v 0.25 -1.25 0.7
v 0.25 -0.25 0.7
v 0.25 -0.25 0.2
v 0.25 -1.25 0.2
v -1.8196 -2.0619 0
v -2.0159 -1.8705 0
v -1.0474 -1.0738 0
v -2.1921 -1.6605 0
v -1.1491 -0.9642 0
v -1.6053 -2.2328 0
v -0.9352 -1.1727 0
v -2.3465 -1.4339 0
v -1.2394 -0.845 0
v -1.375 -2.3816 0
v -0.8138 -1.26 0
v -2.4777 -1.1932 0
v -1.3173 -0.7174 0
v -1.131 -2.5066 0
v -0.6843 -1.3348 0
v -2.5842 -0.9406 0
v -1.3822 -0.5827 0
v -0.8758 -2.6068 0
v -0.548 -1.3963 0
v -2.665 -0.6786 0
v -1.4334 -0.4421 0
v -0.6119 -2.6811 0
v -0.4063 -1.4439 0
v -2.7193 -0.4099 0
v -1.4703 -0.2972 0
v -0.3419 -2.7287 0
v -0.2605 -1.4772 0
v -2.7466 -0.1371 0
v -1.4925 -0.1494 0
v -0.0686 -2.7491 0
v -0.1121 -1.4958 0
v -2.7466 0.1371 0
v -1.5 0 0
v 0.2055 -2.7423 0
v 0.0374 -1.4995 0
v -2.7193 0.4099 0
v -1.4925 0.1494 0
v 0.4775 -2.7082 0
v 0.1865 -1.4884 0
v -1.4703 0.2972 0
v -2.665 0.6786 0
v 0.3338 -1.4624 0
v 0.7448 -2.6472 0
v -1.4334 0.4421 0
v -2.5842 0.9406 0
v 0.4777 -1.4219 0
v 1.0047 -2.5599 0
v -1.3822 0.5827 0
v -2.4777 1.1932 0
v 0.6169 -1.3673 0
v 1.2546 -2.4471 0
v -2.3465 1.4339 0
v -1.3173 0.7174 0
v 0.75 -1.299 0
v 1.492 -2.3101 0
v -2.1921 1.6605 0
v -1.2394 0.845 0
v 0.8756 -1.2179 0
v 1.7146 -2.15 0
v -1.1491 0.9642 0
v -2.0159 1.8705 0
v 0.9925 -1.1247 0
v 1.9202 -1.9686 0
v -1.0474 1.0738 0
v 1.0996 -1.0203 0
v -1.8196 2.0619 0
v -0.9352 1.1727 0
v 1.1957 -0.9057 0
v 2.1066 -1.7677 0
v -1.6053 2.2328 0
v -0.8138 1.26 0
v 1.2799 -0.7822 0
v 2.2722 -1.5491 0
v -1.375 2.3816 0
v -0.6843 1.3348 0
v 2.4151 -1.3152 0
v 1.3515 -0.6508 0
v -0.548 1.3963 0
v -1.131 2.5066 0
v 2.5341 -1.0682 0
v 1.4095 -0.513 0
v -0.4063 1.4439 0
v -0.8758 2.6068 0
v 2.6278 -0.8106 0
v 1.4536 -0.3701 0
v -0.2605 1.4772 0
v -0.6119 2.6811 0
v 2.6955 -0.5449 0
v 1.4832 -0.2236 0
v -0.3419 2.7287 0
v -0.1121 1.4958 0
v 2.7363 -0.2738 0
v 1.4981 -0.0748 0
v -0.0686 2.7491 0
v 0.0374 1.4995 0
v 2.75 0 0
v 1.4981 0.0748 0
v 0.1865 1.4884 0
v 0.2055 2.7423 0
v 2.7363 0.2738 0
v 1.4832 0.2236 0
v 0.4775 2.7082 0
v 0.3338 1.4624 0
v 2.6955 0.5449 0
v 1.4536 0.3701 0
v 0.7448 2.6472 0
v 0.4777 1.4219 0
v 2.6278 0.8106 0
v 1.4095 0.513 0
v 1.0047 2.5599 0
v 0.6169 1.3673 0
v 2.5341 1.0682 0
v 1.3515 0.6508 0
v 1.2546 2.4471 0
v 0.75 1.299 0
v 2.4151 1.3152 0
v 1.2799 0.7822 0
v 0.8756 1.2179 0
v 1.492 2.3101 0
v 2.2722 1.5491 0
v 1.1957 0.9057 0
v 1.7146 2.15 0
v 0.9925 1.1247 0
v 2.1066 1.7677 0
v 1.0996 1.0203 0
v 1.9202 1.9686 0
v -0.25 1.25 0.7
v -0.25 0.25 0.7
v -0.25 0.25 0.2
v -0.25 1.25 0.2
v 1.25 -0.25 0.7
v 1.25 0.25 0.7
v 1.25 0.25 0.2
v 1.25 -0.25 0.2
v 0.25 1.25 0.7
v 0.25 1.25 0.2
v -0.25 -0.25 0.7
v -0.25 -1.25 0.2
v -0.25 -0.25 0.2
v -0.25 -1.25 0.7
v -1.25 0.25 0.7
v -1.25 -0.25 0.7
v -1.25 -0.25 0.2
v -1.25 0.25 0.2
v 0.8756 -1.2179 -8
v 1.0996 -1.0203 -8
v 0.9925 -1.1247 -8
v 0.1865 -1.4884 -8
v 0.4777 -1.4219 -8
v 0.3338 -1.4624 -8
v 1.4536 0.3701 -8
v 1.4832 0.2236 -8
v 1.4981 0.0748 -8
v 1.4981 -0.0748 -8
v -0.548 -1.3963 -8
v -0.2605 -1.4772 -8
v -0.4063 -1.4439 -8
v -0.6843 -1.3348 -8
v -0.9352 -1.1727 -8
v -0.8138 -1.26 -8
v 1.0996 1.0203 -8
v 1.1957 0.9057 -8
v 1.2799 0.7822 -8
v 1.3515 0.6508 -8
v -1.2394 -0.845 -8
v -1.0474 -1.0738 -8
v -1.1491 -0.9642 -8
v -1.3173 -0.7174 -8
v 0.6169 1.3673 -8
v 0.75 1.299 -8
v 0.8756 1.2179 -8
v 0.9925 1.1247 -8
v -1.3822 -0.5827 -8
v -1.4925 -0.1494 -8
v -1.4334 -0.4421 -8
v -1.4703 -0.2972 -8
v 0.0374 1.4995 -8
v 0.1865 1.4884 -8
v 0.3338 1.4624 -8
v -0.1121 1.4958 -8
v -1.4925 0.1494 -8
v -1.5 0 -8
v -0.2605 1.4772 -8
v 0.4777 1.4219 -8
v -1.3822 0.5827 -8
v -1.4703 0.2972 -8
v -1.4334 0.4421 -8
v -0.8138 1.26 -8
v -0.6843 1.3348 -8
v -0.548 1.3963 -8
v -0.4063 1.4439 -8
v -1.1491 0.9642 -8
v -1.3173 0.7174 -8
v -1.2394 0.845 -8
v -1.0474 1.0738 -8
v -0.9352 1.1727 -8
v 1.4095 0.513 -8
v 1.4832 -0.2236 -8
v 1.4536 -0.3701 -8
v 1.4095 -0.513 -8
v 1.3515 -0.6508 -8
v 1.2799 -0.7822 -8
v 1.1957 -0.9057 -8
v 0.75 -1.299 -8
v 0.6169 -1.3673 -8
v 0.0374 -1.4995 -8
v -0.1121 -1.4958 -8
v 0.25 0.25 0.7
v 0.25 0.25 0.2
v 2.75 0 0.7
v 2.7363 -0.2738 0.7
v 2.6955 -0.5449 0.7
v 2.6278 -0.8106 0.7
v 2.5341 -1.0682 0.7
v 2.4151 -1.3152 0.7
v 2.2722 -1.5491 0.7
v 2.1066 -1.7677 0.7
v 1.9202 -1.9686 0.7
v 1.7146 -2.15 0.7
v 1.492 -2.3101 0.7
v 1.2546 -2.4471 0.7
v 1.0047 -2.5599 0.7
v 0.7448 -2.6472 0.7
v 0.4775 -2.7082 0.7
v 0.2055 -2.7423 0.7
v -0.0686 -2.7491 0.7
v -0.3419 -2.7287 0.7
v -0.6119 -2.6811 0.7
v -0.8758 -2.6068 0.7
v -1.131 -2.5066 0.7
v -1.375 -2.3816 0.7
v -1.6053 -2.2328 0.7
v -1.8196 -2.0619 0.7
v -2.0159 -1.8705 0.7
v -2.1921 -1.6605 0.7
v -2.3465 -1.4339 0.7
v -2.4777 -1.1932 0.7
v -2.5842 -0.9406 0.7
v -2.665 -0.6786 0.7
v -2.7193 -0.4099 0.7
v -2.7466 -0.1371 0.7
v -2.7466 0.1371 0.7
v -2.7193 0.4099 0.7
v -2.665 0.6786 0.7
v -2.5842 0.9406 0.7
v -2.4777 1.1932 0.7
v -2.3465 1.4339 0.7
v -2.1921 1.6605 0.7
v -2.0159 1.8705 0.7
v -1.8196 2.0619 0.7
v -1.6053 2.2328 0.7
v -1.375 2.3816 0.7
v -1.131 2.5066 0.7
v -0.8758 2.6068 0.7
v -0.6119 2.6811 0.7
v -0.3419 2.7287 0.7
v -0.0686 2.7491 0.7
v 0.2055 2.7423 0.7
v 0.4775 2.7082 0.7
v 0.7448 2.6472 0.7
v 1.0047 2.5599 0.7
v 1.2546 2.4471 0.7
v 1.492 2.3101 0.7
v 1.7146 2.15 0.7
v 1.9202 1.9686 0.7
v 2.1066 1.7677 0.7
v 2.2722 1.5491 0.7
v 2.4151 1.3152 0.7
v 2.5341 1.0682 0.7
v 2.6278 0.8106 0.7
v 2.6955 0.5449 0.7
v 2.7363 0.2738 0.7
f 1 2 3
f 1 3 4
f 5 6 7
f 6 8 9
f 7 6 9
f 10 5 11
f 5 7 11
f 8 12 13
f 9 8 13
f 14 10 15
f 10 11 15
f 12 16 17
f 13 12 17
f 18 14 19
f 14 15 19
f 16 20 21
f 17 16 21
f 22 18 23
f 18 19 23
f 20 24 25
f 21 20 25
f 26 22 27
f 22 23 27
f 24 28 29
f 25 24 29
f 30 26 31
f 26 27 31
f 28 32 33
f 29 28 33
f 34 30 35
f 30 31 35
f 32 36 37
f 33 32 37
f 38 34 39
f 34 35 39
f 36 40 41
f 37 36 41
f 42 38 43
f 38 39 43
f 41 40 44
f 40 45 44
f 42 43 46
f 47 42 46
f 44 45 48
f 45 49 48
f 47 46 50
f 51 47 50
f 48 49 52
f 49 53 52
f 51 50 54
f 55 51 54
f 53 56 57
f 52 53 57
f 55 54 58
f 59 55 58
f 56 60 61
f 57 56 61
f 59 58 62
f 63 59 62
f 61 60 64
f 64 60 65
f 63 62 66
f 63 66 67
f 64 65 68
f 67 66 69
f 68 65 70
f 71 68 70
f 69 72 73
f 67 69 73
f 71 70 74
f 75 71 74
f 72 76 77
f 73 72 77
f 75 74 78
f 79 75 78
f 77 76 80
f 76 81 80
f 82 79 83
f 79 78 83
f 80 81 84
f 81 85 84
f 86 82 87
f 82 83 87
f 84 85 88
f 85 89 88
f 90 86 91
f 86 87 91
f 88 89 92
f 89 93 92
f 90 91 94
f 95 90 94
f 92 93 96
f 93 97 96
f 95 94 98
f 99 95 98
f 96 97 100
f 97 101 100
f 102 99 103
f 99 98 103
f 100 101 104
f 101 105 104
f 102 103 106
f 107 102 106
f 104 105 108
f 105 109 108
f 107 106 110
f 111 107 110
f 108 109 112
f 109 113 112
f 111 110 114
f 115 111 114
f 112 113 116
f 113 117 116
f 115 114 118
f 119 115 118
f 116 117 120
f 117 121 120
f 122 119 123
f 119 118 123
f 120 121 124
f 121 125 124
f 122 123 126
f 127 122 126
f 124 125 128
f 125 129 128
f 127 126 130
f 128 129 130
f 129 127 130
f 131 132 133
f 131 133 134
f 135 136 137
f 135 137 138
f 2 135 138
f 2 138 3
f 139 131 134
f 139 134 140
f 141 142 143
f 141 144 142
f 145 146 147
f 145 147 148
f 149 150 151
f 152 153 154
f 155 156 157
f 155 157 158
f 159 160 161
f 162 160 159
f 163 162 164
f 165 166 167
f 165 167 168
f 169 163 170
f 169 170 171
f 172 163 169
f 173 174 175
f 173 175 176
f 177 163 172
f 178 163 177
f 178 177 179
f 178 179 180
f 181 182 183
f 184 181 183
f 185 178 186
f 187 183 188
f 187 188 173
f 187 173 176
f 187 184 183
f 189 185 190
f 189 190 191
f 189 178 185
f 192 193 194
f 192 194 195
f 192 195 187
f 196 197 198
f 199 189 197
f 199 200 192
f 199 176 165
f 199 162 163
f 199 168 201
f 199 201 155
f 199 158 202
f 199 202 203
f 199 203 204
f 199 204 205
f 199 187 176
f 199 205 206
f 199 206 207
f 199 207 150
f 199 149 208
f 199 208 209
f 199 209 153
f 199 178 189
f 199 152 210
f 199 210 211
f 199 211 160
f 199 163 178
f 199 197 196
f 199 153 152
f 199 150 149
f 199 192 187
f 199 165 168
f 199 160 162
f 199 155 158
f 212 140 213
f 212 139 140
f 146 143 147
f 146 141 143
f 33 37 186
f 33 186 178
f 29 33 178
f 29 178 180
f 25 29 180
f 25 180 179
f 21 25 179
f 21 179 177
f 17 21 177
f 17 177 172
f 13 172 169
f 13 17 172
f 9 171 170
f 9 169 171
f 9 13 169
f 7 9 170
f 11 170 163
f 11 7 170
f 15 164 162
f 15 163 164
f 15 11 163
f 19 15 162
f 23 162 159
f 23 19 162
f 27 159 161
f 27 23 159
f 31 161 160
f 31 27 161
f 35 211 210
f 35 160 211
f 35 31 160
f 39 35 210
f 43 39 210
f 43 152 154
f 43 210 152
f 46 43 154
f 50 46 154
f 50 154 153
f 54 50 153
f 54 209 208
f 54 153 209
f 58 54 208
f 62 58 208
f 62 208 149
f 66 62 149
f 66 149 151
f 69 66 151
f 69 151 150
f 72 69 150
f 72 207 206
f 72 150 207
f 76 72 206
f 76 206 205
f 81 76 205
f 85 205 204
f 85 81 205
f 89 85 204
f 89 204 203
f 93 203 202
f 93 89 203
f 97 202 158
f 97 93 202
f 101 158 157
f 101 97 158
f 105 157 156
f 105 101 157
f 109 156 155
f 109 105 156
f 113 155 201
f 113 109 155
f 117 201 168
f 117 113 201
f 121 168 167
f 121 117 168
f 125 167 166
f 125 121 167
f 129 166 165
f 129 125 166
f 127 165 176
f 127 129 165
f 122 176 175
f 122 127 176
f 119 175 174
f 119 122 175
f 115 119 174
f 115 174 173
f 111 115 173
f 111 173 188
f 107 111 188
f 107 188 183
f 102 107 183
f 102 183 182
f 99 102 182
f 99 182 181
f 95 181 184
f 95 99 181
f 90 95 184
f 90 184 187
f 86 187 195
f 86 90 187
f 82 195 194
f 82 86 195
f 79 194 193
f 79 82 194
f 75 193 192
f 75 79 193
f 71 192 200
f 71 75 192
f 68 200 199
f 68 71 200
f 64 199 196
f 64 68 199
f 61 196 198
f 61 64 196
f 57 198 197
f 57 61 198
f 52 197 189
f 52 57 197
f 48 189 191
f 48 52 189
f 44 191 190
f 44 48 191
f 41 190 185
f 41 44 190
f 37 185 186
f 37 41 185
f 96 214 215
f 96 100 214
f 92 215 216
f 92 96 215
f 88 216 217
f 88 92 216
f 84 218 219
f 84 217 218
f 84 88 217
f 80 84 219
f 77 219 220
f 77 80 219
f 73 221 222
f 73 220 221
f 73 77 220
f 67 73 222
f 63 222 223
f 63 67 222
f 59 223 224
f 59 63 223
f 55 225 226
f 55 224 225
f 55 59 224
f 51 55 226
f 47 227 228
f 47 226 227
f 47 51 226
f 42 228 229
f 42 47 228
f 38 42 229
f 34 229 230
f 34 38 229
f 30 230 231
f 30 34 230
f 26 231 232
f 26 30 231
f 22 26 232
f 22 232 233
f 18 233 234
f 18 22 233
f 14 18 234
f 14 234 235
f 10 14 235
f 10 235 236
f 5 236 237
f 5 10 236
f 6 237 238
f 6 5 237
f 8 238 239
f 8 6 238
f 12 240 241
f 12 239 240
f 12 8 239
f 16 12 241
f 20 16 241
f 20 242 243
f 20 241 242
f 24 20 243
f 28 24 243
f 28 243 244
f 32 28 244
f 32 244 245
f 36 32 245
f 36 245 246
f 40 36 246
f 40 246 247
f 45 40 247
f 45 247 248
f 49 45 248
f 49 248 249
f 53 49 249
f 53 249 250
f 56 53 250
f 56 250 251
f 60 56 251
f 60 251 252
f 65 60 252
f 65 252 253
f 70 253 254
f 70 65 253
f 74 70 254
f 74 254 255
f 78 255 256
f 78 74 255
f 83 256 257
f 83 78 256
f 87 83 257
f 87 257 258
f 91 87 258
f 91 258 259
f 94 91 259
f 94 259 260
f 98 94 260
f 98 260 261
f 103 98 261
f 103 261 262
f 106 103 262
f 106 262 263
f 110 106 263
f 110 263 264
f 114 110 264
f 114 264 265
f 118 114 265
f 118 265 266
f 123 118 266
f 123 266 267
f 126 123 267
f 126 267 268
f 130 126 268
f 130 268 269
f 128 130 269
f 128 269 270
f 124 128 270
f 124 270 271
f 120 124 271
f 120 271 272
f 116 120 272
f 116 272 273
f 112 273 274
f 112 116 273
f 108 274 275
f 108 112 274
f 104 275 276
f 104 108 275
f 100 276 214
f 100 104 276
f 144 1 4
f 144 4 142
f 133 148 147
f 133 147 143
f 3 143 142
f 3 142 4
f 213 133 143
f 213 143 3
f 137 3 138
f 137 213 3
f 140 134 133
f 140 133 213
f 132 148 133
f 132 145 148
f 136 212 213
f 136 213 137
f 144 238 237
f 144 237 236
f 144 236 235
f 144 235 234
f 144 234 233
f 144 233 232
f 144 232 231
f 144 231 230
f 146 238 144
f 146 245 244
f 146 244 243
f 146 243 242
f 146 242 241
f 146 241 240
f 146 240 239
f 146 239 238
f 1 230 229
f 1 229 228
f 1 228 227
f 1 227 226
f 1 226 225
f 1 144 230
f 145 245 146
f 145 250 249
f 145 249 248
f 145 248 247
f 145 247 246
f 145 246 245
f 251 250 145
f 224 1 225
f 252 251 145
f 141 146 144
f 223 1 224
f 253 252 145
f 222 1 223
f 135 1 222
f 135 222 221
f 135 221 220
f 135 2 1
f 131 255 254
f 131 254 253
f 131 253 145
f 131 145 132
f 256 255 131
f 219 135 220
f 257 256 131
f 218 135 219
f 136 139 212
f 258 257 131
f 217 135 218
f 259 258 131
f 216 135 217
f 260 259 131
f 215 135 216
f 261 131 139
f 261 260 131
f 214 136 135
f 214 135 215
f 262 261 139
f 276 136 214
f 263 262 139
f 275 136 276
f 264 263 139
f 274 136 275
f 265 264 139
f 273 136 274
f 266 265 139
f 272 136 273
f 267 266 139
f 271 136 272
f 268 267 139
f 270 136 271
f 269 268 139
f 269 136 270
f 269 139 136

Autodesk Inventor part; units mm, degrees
ref_plane "YZ Plane" through (0, 0, 0) normal (1, 0, 0) x (0, 1, 0)
ref_plane "XZ Plane" through (0, 0, 0) normal (0, 1, 0) x (-1, 0, 0)
ref_plane "XY Plane" through (0, 0, 0) normal (0, 0, 1) x (1, 0, 0)
sketch "スケッチ1" plane through (0, 0, 0) normal (0, 0, 1) x (1, 0, 0)
  circle A0 centre (0, 0) radius 2.75
  dimension "d0" = 5.5
extrude "押し出し1" add sketch "スケッチ1" along normal blind 0.7
sketch "スケッチ2" plane through (0, 0, 0) normal (0, 0, -1) x (-1, 0, 0)
  circle A0 centre (0, 0) radius 1.5
  dimension "d3" = 3
extrude "押し出し2" add sketch "スケッチ2" along normal blind 8
sketch "スケッチ3" plane through (0, 0, 0.7) normal (0, 0, 1) x (1, 0, 0)
  line L0 (-1.25, 0.25) -> (1.25, 0.25)
  line L1 (1.25, 0.25) -> (1.25, -0.25)
  line L2 (1.25, -0.25) -> (-1.25, -0.25)
  line L3 (-1.25, -0.25) -> (-1.25, 0.25)
  line L4 (-0.25, 1.25) -> (0.25, 1.25)
  line L5 (0.25, 1.25) -> (0.25, -1.25)
  line L6 (0.25, -1.25) -> (-0.25, -1.25)
  line L7 (-0.25, -1.25) -> (-0.25, 1.25)
  line L8 (0, 0) -> (0, 1.7976)
  line L9 (0, 0) -> (2.75, 0)
  circle A0 centre (0, 0) radius 2.75 projected
  point P0 (-0.25, 0.25)
  point P1 (-0.25, -0.25)
  point P2 (0.25, -0.25)
  point P3 (0.25, 0.25)
  dimension "d6" = 0.5
  dimension "d7" = 0.5
  dimension "d8" = 2.5
  dimension "d9" = 2.5
extrude "押し出し3" cut sketch "スケッチ3" against normal blind 0.5 contours L0 L7 L2 L3 | L7 L4 L8 L0 | L0 L8 L9 L5 L2 L7 | L8 L4 L5 L0 | L0 L5 L9 L8 | L2 L5 L6 L7 | L0 L1 L9 L5 | L5 L9 L1 L2
properties part number "CSPELH-SUS-M3-7"
